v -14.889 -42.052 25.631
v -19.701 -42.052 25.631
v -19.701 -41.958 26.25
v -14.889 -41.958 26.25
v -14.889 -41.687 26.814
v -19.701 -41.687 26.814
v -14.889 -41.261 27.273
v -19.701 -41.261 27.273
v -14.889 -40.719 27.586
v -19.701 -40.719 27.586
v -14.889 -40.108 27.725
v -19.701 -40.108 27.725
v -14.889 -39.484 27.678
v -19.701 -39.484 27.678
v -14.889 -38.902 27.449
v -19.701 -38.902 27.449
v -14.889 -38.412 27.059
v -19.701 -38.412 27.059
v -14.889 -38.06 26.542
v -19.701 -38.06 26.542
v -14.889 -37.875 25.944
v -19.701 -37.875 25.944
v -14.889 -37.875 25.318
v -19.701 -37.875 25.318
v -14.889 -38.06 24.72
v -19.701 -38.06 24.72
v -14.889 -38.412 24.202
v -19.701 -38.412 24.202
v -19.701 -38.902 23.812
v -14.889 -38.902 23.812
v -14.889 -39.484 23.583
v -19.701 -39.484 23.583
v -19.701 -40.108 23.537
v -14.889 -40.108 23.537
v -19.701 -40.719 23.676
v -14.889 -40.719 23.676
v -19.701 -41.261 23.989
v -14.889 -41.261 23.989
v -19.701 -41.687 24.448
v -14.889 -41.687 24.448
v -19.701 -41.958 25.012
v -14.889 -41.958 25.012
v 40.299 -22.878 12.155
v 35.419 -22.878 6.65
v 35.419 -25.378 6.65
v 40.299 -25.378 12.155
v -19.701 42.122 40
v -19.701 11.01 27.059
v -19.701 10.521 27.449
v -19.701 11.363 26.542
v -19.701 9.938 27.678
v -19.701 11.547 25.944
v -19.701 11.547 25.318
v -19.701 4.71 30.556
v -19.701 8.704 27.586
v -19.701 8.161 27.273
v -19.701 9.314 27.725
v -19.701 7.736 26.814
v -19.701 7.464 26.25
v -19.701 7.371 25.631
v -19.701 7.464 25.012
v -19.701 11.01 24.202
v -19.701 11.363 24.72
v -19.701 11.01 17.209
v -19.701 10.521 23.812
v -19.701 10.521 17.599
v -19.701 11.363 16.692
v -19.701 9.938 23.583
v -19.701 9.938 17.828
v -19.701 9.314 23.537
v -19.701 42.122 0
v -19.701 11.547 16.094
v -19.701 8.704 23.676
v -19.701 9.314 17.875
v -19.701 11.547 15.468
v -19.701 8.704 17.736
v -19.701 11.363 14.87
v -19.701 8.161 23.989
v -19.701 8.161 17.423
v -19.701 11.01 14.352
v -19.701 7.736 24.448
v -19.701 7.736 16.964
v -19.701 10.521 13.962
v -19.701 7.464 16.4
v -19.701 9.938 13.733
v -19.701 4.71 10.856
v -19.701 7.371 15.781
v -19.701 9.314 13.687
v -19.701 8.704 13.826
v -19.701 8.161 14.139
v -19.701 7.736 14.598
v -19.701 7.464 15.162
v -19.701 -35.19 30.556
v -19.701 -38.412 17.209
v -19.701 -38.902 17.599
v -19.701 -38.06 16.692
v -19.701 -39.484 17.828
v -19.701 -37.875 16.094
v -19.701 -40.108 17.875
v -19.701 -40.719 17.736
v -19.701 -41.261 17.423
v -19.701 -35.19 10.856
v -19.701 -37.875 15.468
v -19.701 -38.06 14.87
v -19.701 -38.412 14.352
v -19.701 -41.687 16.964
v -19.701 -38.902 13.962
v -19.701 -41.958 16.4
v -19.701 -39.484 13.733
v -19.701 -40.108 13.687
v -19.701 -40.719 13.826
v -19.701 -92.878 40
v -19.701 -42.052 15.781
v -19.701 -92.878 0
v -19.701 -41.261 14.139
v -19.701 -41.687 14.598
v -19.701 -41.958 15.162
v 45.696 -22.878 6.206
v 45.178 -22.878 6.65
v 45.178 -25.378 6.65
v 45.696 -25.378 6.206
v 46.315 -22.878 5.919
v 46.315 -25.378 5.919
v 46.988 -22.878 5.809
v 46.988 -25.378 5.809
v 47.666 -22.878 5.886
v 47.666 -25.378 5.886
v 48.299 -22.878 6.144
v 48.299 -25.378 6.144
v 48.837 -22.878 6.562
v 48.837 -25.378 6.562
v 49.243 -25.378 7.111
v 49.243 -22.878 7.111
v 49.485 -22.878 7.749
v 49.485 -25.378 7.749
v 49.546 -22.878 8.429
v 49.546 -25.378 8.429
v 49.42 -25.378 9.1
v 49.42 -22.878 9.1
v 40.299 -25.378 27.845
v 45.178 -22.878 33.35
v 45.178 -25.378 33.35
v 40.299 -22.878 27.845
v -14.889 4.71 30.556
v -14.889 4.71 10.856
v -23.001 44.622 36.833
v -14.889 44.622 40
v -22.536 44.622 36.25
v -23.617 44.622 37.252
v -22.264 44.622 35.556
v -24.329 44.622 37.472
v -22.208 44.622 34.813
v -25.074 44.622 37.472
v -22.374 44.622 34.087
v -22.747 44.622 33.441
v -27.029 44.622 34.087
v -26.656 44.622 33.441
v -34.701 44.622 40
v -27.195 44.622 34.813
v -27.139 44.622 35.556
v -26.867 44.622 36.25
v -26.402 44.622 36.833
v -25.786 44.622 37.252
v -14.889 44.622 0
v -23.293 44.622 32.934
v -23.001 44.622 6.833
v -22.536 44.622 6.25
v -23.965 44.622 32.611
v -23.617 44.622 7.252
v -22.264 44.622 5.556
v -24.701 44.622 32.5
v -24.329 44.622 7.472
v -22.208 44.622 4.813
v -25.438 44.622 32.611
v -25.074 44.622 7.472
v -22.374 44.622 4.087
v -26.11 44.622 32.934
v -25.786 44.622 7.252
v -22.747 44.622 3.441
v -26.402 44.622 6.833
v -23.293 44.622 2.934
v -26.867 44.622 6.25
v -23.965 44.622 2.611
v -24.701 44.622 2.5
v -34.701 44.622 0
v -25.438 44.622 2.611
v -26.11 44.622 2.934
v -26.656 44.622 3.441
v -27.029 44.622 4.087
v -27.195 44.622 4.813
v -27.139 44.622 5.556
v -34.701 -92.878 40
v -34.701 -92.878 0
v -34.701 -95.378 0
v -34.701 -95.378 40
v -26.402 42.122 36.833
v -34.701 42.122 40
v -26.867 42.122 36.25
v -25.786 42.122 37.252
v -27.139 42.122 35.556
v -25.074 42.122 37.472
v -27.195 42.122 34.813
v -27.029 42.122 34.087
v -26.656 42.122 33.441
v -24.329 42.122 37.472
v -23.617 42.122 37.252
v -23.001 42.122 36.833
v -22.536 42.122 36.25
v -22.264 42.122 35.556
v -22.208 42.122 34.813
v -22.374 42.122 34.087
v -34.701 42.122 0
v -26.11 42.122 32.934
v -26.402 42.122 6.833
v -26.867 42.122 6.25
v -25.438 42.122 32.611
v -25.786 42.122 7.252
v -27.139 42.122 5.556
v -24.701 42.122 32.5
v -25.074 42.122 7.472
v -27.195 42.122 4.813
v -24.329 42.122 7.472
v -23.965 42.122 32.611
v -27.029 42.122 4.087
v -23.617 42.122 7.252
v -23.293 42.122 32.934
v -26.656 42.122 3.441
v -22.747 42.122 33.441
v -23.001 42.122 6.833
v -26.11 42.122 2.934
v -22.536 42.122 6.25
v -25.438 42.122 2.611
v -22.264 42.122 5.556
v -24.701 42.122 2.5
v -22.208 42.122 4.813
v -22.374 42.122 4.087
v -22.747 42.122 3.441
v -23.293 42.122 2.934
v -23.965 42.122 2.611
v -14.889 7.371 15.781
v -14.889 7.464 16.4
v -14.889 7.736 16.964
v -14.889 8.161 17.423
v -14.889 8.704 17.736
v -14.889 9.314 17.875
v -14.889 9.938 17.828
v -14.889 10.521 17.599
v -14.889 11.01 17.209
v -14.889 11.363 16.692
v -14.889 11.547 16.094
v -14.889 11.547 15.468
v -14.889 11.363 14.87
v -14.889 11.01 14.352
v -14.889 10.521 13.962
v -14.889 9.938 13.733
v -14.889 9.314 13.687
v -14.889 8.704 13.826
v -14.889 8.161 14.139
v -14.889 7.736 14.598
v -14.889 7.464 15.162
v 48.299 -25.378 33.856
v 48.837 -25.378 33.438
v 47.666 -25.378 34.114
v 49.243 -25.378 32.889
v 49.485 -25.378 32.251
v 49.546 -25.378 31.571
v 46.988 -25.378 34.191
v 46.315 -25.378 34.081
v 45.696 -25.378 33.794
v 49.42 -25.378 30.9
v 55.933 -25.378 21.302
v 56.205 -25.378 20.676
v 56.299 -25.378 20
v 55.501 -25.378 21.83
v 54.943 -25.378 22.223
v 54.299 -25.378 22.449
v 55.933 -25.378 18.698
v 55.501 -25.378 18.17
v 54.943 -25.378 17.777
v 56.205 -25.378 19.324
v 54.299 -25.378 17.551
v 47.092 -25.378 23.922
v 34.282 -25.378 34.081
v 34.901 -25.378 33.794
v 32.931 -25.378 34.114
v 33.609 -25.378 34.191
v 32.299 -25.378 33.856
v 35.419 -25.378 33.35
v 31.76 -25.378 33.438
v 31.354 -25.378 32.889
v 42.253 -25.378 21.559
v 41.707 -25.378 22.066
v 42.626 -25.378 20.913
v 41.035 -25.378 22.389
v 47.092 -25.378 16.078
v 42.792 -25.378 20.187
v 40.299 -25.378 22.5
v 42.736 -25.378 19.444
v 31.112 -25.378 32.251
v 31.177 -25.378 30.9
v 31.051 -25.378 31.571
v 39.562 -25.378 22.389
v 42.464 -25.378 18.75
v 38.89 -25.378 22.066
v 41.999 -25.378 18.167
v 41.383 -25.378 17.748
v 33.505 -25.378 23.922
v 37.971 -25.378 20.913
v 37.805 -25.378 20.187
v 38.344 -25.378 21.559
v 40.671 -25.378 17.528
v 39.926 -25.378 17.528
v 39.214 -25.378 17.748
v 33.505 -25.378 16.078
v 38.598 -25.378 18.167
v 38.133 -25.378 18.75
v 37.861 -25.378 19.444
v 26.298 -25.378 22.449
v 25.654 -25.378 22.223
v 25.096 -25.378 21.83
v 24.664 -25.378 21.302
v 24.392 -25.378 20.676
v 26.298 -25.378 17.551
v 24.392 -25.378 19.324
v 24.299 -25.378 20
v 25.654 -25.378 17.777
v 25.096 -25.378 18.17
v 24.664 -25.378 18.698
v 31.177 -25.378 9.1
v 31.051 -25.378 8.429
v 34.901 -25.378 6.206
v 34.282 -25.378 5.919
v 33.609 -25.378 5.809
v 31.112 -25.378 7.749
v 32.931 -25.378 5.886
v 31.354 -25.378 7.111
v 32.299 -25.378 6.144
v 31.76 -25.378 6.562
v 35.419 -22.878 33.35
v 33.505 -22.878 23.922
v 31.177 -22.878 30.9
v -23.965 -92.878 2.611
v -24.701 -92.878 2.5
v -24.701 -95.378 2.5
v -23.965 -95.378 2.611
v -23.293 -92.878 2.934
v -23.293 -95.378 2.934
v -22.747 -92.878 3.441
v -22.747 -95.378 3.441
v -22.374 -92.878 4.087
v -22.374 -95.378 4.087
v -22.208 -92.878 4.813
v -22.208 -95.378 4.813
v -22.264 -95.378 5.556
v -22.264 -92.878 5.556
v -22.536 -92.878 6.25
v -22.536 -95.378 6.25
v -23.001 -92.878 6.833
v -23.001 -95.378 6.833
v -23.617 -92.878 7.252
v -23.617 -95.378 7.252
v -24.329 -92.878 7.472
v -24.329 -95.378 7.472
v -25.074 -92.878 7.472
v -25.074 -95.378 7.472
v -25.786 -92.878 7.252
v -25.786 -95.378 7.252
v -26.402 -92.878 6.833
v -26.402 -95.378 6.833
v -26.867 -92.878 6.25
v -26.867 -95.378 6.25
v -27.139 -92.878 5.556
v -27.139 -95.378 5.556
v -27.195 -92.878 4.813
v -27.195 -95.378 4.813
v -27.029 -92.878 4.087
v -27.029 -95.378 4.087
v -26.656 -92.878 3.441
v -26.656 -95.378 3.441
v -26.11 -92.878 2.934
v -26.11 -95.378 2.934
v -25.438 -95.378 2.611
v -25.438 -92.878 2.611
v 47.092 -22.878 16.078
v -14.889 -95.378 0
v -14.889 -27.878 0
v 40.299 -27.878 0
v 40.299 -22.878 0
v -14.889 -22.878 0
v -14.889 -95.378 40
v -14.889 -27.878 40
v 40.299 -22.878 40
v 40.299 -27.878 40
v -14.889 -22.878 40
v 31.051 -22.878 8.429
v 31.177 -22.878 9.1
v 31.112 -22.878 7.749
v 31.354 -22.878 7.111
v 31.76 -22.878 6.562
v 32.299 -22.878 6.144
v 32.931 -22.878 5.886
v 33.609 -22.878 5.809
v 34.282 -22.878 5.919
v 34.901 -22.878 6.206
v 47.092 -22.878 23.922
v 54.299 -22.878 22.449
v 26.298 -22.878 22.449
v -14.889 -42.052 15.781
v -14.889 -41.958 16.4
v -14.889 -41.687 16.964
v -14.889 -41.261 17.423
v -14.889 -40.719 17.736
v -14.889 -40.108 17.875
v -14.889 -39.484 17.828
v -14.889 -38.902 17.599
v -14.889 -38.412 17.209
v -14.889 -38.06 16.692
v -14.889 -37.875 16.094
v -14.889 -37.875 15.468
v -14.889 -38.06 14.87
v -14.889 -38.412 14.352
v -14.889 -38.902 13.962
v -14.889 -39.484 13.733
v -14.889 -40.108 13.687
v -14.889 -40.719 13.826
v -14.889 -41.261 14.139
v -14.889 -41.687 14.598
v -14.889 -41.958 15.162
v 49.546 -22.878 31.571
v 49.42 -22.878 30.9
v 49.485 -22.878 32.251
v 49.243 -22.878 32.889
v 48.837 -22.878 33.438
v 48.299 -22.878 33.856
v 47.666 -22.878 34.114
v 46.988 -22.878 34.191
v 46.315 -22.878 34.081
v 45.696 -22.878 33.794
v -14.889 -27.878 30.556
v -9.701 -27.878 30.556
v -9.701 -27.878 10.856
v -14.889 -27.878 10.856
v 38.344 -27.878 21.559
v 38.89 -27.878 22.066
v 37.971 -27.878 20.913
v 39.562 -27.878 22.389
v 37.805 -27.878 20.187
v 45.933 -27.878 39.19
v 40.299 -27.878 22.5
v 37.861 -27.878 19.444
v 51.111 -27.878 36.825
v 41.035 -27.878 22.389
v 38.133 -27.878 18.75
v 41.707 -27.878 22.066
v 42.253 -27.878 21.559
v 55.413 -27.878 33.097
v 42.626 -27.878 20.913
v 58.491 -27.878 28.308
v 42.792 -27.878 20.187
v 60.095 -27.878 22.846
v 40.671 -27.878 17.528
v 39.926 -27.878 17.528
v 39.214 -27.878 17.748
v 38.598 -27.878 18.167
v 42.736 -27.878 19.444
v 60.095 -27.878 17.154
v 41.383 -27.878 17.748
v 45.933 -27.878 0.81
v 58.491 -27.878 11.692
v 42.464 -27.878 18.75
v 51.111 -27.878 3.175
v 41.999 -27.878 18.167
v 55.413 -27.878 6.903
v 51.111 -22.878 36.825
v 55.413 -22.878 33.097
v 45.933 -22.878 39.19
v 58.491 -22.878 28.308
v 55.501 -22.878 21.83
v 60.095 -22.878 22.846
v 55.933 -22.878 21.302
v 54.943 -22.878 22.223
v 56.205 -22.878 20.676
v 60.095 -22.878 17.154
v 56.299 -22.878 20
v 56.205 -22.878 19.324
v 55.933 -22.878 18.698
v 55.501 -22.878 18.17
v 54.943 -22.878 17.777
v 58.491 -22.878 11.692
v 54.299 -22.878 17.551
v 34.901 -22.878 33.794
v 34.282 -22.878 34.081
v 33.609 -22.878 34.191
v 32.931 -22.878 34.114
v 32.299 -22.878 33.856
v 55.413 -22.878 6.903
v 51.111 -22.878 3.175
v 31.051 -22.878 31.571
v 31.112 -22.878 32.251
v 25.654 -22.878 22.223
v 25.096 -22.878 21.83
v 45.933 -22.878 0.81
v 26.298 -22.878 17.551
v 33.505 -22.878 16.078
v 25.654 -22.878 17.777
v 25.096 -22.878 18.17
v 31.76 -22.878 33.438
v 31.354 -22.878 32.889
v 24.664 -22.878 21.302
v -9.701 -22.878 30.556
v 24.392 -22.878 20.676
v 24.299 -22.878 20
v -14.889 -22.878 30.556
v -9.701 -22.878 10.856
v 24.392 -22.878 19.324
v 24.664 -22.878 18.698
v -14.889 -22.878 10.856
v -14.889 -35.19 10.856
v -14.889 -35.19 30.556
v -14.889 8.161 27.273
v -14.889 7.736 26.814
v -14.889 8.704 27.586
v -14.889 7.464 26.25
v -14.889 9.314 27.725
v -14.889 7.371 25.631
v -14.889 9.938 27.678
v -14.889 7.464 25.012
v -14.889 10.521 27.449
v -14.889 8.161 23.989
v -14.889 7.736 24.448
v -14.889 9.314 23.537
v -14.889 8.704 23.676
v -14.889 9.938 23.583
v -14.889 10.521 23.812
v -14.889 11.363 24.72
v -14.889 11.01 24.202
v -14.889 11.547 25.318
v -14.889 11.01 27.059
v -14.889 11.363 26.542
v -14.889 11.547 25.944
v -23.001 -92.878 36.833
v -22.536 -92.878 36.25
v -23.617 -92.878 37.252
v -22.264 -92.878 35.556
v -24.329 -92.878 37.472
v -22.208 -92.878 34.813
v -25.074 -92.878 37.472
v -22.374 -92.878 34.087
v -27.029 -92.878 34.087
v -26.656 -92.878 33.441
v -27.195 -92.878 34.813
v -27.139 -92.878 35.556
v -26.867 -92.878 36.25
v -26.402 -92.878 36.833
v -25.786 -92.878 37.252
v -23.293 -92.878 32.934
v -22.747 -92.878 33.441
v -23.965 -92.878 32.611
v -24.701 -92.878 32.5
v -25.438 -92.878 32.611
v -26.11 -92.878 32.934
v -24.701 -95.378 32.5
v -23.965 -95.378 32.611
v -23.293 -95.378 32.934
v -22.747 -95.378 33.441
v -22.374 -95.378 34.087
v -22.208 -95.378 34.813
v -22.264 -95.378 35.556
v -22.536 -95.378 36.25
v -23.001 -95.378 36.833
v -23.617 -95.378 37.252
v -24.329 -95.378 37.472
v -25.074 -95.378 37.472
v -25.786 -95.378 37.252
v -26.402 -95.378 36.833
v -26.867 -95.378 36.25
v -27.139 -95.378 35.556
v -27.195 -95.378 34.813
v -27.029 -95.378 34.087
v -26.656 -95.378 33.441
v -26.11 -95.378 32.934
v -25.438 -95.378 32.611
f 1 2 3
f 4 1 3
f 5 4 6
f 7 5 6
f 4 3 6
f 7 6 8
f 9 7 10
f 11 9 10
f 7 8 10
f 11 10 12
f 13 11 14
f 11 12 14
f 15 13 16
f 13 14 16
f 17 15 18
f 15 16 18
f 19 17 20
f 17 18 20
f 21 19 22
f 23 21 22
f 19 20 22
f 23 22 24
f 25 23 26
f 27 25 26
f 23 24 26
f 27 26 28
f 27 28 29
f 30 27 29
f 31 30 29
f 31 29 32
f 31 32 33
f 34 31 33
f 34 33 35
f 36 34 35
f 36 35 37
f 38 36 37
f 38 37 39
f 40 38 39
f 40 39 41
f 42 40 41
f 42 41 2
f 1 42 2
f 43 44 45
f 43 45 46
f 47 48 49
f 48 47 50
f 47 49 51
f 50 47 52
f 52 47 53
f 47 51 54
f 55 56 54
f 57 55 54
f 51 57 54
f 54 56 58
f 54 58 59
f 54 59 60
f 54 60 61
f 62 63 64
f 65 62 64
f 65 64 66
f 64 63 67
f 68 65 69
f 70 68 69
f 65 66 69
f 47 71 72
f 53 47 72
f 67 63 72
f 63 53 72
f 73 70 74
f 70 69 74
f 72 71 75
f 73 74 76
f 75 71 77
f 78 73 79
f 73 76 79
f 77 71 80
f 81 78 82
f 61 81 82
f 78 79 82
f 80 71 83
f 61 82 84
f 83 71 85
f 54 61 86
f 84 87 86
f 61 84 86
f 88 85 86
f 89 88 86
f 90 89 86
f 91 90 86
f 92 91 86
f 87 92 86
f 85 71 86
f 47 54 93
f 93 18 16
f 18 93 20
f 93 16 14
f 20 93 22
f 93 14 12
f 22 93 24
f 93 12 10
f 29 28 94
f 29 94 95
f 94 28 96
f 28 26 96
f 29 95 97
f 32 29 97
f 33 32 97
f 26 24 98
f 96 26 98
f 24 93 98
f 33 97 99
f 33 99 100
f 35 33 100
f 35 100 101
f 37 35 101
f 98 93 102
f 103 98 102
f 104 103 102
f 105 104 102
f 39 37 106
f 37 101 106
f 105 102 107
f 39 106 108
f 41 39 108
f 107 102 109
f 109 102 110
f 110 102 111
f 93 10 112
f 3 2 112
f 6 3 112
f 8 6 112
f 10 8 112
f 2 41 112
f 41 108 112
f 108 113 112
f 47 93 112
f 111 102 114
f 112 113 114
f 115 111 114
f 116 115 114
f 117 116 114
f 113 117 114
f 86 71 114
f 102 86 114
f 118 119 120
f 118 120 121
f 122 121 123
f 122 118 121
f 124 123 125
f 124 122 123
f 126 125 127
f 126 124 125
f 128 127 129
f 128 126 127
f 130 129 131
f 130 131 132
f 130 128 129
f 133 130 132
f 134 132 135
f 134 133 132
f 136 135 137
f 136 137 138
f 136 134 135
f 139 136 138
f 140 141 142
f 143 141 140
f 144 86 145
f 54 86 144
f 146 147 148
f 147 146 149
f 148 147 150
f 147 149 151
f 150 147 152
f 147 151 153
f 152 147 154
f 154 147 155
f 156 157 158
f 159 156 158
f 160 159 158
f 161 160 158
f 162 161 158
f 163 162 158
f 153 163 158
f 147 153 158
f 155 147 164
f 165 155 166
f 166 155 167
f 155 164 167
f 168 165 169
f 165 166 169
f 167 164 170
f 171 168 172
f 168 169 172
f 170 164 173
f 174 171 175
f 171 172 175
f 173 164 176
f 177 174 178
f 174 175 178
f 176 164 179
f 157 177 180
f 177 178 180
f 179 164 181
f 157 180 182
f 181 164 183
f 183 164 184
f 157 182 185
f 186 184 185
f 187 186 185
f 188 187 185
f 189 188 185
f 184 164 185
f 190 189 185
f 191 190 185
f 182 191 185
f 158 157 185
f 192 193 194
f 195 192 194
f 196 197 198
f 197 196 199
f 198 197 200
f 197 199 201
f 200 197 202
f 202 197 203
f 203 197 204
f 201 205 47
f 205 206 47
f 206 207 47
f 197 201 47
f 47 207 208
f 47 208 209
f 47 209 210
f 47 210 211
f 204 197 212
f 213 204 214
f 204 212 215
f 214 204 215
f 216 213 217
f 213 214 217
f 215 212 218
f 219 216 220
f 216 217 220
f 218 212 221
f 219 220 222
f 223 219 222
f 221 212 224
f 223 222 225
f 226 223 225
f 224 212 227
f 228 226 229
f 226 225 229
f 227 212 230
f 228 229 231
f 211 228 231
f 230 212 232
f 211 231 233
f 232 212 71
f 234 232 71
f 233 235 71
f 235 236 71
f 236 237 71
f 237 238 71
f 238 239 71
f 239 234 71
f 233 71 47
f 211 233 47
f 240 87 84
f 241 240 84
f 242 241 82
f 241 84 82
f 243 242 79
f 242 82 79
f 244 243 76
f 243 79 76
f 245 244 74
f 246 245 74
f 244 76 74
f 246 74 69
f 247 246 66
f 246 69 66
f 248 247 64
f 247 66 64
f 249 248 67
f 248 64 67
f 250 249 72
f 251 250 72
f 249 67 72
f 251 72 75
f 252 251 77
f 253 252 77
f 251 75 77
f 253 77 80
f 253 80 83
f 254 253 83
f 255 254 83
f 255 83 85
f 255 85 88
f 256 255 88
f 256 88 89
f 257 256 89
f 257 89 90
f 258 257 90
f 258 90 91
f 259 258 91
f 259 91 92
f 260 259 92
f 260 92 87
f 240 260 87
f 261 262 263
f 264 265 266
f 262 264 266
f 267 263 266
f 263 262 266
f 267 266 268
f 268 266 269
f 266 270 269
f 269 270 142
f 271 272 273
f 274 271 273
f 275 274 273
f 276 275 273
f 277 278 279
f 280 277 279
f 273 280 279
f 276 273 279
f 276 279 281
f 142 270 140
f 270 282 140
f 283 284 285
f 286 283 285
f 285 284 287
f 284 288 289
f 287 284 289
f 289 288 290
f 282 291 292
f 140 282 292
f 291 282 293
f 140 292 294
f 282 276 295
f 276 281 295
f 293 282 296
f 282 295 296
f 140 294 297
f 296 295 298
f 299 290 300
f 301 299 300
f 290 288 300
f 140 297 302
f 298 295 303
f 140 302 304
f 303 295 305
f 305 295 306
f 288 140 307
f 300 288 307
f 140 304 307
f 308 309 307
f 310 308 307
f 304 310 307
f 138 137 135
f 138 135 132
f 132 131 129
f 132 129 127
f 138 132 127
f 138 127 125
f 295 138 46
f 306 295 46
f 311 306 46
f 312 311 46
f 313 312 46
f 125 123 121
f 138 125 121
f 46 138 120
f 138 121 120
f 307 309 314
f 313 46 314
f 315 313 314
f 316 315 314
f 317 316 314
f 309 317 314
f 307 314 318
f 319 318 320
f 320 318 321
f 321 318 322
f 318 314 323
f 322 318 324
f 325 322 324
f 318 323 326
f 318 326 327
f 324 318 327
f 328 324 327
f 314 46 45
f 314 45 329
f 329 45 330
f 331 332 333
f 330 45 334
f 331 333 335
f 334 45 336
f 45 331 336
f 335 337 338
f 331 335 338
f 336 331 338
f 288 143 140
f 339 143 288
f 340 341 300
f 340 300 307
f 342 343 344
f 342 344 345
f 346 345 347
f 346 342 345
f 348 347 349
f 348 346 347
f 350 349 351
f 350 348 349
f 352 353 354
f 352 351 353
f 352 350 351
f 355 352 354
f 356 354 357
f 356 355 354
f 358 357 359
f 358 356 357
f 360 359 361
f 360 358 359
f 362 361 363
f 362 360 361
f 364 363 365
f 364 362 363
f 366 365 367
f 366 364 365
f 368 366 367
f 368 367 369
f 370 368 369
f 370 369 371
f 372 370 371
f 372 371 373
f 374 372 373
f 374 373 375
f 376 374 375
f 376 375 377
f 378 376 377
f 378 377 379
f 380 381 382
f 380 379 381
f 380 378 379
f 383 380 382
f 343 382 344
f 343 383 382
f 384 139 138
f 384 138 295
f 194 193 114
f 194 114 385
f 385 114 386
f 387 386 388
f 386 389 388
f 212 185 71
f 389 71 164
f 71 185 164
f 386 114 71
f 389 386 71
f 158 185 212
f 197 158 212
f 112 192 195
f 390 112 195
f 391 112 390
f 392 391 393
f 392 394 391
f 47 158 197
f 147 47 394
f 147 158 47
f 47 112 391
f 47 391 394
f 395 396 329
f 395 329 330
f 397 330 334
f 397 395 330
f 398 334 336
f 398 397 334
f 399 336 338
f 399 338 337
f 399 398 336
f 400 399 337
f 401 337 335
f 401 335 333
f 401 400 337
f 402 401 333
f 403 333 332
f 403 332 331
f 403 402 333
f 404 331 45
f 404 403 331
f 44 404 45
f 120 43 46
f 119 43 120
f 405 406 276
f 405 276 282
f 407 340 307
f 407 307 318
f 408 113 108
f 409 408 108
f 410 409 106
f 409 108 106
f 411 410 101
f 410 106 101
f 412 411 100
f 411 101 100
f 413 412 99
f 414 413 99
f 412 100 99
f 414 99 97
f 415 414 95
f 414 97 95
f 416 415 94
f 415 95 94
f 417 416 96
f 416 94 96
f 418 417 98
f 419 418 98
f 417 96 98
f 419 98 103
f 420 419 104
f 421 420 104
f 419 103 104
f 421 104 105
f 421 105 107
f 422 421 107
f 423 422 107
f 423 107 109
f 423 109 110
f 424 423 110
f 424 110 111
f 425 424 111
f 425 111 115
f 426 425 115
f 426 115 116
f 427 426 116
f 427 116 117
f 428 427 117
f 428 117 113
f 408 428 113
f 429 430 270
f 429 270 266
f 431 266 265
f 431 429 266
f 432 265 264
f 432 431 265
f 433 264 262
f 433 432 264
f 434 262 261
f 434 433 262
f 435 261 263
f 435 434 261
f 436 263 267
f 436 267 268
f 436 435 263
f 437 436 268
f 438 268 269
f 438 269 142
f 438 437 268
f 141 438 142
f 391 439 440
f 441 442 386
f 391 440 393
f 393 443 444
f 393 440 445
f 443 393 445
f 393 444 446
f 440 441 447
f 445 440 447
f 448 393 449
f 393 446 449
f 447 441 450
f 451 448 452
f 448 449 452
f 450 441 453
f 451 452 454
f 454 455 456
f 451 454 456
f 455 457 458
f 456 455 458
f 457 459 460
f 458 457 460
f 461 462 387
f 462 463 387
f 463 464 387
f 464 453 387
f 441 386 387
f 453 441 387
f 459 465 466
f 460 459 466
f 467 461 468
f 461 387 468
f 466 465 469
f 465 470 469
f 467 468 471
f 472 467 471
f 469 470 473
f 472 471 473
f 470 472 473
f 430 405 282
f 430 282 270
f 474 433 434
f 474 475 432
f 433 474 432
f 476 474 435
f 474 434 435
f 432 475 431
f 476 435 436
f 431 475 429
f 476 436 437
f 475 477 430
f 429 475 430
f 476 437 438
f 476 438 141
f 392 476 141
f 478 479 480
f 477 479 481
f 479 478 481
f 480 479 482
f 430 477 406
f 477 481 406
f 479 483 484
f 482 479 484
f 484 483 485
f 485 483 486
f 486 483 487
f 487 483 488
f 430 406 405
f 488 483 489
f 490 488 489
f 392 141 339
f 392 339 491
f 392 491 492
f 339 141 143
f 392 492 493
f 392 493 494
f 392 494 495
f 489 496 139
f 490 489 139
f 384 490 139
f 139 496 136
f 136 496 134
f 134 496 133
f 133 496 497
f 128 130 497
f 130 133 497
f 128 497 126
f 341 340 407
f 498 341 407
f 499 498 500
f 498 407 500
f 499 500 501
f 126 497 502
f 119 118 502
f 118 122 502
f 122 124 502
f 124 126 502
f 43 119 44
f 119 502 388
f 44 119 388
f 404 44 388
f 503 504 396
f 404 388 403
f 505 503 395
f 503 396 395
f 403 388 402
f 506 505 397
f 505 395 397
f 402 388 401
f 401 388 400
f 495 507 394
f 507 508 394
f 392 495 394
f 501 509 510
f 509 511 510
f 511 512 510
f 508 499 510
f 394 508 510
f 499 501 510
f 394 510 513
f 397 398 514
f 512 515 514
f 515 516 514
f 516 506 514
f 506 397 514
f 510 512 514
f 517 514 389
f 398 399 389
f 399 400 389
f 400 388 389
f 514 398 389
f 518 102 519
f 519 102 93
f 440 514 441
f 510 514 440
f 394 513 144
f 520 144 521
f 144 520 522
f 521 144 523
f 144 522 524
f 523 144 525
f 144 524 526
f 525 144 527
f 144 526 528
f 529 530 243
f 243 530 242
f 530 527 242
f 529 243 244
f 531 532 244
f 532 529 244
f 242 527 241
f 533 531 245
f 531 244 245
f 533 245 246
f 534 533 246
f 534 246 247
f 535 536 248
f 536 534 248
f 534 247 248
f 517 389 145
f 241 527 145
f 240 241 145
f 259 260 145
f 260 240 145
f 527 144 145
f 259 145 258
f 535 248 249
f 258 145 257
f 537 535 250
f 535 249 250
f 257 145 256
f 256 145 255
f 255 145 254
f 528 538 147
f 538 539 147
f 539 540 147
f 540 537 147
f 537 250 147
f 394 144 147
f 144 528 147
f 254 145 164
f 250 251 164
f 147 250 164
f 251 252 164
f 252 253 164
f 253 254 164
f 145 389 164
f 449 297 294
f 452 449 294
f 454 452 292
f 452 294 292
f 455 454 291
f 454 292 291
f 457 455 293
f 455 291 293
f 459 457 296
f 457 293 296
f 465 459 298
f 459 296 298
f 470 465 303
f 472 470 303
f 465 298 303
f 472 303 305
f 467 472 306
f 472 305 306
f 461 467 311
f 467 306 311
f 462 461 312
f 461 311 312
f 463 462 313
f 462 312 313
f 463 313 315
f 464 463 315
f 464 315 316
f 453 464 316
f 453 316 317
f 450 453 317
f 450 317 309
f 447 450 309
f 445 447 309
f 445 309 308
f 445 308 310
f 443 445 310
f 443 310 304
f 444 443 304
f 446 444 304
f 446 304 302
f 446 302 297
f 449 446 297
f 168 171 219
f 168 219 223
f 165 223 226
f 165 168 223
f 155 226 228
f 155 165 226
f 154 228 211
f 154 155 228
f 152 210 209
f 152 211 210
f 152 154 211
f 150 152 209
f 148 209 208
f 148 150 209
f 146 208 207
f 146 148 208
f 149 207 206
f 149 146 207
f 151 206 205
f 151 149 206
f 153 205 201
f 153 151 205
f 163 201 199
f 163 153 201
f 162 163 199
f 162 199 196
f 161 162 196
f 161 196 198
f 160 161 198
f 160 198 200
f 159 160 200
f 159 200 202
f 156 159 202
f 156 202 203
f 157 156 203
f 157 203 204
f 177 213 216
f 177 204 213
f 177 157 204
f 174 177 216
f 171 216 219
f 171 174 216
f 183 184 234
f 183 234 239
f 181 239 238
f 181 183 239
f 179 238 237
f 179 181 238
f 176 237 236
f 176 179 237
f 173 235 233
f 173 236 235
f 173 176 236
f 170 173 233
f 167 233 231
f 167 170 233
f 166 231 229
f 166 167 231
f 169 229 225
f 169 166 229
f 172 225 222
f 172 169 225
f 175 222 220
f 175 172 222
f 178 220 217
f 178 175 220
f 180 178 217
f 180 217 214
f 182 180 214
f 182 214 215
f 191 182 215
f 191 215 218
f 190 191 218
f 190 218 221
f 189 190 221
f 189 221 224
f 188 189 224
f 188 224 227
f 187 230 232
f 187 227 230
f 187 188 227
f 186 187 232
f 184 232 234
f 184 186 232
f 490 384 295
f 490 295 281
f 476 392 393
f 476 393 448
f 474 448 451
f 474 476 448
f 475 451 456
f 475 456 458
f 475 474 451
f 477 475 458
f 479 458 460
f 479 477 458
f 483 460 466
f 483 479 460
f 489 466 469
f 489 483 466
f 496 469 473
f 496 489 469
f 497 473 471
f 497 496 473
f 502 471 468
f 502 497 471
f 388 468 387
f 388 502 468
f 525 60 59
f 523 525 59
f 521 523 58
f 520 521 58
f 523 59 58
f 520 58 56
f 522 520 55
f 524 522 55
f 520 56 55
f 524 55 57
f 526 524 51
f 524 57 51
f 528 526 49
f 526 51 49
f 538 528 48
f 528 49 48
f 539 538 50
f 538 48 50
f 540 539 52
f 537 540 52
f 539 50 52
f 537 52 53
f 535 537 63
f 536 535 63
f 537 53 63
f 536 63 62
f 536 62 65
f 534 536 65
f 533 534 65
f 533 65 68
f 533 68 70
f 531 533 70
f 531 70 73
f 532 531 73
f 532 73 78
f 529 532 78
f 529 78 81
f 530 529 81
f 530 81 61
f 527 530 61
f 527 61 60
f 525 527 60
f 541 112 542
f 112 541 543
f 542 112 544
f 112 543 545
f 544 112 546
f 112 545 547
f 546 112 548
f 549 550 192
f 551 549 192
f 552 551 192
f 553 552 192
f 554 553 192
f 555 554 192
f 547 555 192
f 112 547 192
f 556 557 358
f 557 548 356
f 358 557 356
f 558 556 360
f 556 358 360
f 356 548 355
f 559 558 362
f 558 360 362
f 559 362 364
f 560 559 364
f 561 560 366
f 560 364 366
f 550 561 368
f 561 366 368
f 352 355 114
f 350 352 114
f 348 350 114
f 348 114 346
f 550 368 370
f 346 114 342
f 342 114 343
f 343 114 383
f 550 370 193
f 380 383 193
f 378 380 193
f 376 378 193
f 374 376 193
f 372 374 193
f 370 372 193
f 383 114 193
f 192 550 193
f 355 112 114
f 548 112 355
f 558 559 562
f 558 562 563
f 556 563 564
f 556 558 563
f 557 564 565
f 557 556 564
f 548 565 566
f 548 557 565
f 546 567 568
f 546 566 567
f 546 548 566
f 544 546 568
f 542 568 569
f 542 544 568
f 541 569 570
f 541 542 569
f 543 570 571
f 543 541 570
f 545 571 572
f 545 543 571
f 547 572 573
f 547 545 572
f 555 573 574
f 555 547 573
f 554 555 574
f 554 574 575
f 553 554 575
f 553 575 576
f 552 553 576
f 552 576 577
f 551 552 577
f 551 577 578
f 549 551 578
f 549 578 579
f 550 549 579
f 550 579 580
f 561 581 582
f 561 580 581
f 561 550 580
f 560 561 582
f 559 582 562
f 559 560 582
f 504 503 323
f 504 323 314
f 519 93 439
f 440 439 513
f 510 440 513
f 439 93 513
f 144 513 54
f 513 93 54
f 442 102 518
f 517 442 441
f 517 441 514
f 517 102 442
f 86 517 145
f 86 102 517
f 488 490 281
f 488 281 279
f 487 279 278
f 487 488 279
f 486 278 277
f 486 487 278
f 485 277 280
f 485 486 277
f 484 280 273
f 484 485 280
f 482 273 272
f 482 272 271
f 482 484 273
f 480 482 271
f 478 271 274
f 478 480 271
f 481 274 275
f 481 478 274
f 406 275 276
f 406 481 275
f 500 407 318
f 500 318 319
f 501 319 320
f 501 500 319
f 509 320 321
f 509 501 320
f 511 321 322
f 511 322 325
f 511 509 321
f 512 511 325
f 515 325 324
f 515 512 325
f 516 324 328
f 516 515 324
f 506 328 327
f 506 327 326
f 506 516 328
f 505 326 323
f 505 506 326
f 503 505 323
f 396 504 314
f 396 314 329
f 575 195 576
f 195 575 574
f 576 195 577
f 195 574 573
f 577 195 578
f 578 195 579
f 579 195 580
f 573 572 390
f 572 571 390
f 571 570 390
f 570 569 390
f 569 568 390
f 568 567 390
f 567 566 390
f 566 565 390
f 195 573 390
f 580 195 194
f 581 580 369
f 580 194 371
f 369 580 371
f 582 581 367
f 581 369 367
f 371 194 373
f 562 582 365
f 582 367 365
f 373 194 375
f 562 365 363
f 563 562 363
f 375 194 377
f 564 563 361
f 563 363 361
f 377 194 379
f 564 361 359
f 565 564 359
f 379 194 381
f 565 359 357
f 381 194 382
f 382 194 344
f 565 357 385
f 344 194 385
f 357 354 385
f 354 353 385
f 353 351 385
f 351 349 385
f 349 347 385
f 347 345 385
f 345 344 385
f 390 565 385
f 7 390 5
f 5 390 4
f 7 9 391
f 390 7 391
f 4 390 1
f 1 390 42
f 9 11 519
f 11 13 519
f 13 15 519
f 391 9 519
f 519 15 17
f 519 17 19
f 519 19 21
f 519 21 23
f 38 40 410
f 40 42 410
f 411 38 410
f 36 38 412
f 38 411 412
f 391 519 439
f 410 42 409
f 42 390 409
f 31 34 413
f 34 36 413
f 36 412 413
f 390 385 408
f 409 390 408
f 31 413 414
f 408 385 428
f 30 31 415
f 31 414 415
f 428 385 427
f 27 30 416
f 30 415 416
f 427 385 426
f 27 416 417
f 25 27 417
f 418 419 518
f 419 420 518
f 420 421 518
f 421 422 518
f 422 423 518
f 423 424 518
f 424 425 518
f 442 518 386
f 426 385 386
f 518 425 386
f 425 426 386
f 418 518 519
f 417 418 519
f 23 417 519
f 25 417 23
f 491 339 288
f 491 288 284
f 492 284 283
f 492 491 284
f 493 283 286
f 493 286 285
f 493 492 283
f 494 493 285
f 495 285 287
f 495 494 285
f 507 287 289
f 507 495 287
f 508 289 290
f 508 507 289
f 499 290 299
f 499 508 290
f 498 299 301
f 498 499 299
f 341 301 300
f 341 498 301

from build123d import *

# Parameters (mm, degrees)
BOSS_EXTRUDE2_DEPTH     = 40
FILLET3_RADIUS          = 20
FILLET3_LENGTH          = 5
SKETCH5_R               = 2.5
CUT_EXTRUDE2_DEPTH      = 40
SKETCH6_R               = 2.1
SKETCH6_W               = 19.7
SKETCH6_H               = 39.9
CUT_EXTRUDE3_DEPTH      = 10
CUT_EXTRUDE4_DEPTH      = 2.5
CUT_EXTRUDE5_DEPTH      = 138
CUT_EXTRUDE5_DEPTH_BACK = 49
SKETCH8_R               = 2.5


with BuildPart() as part:
    # Sketch4 → Boss-Extrude2 (new body)
    with BuildSketch(Plane.XY):
        Polygon((-19.701492537, 42.12238806), (-19.701492537, -27.87761194), (-19.701492537, -92.87761194), (-34.701492537, -92.87761194), (-34.701492537, -95.37761194), (-14.889132329, -95.37761194), (-14.889132329, -27.87761194), (60.298507463, -27.87761194), (60.298507463, -22.87761194), (-14.889132329, -22.87761194), (-14.889132329, 44.62238806), (-34.701492537, 44.62238806), (-34.701492537, 42.12238806), align=None)
    extrude(amount=BOSS_EXTRUDE2_DEPTH)

    # Fillet3: full round fillet: the end face becomes a half cylinder, R = half its width
    fillet3_face = Plane((60.298507463, -25.37761194, 20), x_dir=(0, 1, 0), z_dir=(1, 0, 0))  # on the end face: x along it, z out of the body
    fillet3_slab = fillet3_face.offset(-FILLET3_RADIUS / 2) * Box(FILLET3_LENGTH, 2 * FILLET3_RADIUS, FILLET3_RADIUS, mode=Mode.PRIVATE)  # the body's end, R deep
    fillet3_round = Plane((40.298507463, -25.37761194, 20), x_dir=(1, 0, 0), z_dir=(0, 1, 0)) * Cylinder(FILLET3_RADIUS, FILLET3_LENGTH, mode=Mode.PRIVATE)  # its axis R under the face
    add(fillet3_slab - fillet3_round, mode=Mode.SUBTRACT)

    # Sketch5 → Cut-Extrude2 (cut)
    with BuildSketch(Plane(origin=(0, -22.87761194, 0), x_dir=(1, 0, 0), z_dir=(0, 1, 0))):
        with Locations(Location((40.298507463, -20, 0), (0, 0, 270))):
            Circle(SKETCH5_R)
    extrude(amount=-CUT_EXTRUDE2_DEPTH, mode=Mode.SUBTRACT)

    # Sketch6 → Cut-Extrude3 (cut)
    with BuildSketch(Plane.ZY.offset(19.701492537)):
        with Locations(Location((15.780795158, 9.470750249, 0), (0, 0, 270))):
            Circle(SKETCH6_R)
        with Locations(Location((25.630795158, 9.470750249, 0), (0, 0, 270))):
            Circle(SKETCH6_R)
        with Locations(Location((15.780795158, -39.951540987, 0), (0, 0, 270))):
            Circle(SKETCH6_R)
        with Locations(Location((25.630795158, -39.951540987, 0), (0, 0, 270))):
            Circle(SKETCH6_R)
        with Locations((20.705795158, -15.240395369)):
            Rectangle(SKETCH6_W, SKETCH6_H)
    extrude(amount=-CUT_EXTRUDE3_DEPTH, mode=Mode.SUBTRACT)

    # Sketch7 → Cut-Extrude4 (cut)
    with BuildSketch(Plane(origin=(0, -22.87761194, 0), x_dir=(1, 0, 0), z_dir=(0, 1, 0))):
        with BuildLine():
            Line((35.419373283, -6.650386539), (40.298507463, -12.155040525))
            Line((40.298507463, -12.155040525), (45.177641643, -6.650386539))
            ThreePointArc((45.177641643, -6.650386539), (48.298507463, -6.143593539), (49.42004476, -9.099739121))
            Line((49.42004476, -9.099739121), (47.09244166, -16.077520262))
            Line((47.09244166, -16.077520262), (54.29917894, -17.550647418))
            ThreePointArc((54.29917894, -17.550647418), (56.298507463, -20), (54.29917894, -22.449352582))
            Line((54.29917894, -22.449352582), (47.09244166, -23.922479738))
            Line((47.09244166, -23.922479738), (49.42004476, -30.900260879))
            ThreePointArc((49.42004476, -30.900260879), (48.298507463, -33.856406461), (45.177641643, -33.349613461))
            Line((45.177641643, -33.349613461), (40.298507463, -27.844959475))
            Line((40.298507463, -27.844959475), (35.419373283, -33.349613461))
            ThreePointArc((35.419373283, -33.349613461), (32.298507463, -33.856406461), (31.176970165, -30.900260879))
            Line((31.176970165, -30.900260879), (33.504573265, -23.922479738))
            Line((33.504573265, -23.922479738), (26.297835985, -22.449352582))
            ThreePointArc((26.297835985, -22.449352582), (24.298507463, -20), (26.297835985, -17.550647418))
            Line((26.297835985, -17.550647418), (33.504573265, -16.077520262))
            Line((33.504573265, -16.077520262), (31.176970165, -9.099739121))
            ThreePointArc((31.176970165, -9.099739121), (32.298507463, -6.143593539), (35.419373283, -6.650386539))
        make_face()
    extrude(amount=-CUT_EXTRUDE4_DEPTH, mode=Mode.SUBTRACT)

    # Sketch8 → Cut-Extrude5 (cut, two sides: drawn at the far end of the back side and taken through both)
    with BuildSketch(Plane(origin=(0, 22.12238806, 0), x_dir=(-1, 0, 0), z_dir=(0, -1, 0)).offset(-CUT_EXTRUDE5_DEPTH_BACK)):
        with Locations(Location((24.701492537, -5, 0), (0, 0, 90))):
            Circle(SKETCH8_R)
        with Locations(Location((24.701492537, -35, 0), (0, 0, 90))):
            Circle(SKETCH8_R)
    extrude(amount=CUT_EXTRUDE5_DEPTH + CUT_EXTRUDE5_DEPTH_BACK, mode=Mode.SUBTRACT)


solid = part.part
